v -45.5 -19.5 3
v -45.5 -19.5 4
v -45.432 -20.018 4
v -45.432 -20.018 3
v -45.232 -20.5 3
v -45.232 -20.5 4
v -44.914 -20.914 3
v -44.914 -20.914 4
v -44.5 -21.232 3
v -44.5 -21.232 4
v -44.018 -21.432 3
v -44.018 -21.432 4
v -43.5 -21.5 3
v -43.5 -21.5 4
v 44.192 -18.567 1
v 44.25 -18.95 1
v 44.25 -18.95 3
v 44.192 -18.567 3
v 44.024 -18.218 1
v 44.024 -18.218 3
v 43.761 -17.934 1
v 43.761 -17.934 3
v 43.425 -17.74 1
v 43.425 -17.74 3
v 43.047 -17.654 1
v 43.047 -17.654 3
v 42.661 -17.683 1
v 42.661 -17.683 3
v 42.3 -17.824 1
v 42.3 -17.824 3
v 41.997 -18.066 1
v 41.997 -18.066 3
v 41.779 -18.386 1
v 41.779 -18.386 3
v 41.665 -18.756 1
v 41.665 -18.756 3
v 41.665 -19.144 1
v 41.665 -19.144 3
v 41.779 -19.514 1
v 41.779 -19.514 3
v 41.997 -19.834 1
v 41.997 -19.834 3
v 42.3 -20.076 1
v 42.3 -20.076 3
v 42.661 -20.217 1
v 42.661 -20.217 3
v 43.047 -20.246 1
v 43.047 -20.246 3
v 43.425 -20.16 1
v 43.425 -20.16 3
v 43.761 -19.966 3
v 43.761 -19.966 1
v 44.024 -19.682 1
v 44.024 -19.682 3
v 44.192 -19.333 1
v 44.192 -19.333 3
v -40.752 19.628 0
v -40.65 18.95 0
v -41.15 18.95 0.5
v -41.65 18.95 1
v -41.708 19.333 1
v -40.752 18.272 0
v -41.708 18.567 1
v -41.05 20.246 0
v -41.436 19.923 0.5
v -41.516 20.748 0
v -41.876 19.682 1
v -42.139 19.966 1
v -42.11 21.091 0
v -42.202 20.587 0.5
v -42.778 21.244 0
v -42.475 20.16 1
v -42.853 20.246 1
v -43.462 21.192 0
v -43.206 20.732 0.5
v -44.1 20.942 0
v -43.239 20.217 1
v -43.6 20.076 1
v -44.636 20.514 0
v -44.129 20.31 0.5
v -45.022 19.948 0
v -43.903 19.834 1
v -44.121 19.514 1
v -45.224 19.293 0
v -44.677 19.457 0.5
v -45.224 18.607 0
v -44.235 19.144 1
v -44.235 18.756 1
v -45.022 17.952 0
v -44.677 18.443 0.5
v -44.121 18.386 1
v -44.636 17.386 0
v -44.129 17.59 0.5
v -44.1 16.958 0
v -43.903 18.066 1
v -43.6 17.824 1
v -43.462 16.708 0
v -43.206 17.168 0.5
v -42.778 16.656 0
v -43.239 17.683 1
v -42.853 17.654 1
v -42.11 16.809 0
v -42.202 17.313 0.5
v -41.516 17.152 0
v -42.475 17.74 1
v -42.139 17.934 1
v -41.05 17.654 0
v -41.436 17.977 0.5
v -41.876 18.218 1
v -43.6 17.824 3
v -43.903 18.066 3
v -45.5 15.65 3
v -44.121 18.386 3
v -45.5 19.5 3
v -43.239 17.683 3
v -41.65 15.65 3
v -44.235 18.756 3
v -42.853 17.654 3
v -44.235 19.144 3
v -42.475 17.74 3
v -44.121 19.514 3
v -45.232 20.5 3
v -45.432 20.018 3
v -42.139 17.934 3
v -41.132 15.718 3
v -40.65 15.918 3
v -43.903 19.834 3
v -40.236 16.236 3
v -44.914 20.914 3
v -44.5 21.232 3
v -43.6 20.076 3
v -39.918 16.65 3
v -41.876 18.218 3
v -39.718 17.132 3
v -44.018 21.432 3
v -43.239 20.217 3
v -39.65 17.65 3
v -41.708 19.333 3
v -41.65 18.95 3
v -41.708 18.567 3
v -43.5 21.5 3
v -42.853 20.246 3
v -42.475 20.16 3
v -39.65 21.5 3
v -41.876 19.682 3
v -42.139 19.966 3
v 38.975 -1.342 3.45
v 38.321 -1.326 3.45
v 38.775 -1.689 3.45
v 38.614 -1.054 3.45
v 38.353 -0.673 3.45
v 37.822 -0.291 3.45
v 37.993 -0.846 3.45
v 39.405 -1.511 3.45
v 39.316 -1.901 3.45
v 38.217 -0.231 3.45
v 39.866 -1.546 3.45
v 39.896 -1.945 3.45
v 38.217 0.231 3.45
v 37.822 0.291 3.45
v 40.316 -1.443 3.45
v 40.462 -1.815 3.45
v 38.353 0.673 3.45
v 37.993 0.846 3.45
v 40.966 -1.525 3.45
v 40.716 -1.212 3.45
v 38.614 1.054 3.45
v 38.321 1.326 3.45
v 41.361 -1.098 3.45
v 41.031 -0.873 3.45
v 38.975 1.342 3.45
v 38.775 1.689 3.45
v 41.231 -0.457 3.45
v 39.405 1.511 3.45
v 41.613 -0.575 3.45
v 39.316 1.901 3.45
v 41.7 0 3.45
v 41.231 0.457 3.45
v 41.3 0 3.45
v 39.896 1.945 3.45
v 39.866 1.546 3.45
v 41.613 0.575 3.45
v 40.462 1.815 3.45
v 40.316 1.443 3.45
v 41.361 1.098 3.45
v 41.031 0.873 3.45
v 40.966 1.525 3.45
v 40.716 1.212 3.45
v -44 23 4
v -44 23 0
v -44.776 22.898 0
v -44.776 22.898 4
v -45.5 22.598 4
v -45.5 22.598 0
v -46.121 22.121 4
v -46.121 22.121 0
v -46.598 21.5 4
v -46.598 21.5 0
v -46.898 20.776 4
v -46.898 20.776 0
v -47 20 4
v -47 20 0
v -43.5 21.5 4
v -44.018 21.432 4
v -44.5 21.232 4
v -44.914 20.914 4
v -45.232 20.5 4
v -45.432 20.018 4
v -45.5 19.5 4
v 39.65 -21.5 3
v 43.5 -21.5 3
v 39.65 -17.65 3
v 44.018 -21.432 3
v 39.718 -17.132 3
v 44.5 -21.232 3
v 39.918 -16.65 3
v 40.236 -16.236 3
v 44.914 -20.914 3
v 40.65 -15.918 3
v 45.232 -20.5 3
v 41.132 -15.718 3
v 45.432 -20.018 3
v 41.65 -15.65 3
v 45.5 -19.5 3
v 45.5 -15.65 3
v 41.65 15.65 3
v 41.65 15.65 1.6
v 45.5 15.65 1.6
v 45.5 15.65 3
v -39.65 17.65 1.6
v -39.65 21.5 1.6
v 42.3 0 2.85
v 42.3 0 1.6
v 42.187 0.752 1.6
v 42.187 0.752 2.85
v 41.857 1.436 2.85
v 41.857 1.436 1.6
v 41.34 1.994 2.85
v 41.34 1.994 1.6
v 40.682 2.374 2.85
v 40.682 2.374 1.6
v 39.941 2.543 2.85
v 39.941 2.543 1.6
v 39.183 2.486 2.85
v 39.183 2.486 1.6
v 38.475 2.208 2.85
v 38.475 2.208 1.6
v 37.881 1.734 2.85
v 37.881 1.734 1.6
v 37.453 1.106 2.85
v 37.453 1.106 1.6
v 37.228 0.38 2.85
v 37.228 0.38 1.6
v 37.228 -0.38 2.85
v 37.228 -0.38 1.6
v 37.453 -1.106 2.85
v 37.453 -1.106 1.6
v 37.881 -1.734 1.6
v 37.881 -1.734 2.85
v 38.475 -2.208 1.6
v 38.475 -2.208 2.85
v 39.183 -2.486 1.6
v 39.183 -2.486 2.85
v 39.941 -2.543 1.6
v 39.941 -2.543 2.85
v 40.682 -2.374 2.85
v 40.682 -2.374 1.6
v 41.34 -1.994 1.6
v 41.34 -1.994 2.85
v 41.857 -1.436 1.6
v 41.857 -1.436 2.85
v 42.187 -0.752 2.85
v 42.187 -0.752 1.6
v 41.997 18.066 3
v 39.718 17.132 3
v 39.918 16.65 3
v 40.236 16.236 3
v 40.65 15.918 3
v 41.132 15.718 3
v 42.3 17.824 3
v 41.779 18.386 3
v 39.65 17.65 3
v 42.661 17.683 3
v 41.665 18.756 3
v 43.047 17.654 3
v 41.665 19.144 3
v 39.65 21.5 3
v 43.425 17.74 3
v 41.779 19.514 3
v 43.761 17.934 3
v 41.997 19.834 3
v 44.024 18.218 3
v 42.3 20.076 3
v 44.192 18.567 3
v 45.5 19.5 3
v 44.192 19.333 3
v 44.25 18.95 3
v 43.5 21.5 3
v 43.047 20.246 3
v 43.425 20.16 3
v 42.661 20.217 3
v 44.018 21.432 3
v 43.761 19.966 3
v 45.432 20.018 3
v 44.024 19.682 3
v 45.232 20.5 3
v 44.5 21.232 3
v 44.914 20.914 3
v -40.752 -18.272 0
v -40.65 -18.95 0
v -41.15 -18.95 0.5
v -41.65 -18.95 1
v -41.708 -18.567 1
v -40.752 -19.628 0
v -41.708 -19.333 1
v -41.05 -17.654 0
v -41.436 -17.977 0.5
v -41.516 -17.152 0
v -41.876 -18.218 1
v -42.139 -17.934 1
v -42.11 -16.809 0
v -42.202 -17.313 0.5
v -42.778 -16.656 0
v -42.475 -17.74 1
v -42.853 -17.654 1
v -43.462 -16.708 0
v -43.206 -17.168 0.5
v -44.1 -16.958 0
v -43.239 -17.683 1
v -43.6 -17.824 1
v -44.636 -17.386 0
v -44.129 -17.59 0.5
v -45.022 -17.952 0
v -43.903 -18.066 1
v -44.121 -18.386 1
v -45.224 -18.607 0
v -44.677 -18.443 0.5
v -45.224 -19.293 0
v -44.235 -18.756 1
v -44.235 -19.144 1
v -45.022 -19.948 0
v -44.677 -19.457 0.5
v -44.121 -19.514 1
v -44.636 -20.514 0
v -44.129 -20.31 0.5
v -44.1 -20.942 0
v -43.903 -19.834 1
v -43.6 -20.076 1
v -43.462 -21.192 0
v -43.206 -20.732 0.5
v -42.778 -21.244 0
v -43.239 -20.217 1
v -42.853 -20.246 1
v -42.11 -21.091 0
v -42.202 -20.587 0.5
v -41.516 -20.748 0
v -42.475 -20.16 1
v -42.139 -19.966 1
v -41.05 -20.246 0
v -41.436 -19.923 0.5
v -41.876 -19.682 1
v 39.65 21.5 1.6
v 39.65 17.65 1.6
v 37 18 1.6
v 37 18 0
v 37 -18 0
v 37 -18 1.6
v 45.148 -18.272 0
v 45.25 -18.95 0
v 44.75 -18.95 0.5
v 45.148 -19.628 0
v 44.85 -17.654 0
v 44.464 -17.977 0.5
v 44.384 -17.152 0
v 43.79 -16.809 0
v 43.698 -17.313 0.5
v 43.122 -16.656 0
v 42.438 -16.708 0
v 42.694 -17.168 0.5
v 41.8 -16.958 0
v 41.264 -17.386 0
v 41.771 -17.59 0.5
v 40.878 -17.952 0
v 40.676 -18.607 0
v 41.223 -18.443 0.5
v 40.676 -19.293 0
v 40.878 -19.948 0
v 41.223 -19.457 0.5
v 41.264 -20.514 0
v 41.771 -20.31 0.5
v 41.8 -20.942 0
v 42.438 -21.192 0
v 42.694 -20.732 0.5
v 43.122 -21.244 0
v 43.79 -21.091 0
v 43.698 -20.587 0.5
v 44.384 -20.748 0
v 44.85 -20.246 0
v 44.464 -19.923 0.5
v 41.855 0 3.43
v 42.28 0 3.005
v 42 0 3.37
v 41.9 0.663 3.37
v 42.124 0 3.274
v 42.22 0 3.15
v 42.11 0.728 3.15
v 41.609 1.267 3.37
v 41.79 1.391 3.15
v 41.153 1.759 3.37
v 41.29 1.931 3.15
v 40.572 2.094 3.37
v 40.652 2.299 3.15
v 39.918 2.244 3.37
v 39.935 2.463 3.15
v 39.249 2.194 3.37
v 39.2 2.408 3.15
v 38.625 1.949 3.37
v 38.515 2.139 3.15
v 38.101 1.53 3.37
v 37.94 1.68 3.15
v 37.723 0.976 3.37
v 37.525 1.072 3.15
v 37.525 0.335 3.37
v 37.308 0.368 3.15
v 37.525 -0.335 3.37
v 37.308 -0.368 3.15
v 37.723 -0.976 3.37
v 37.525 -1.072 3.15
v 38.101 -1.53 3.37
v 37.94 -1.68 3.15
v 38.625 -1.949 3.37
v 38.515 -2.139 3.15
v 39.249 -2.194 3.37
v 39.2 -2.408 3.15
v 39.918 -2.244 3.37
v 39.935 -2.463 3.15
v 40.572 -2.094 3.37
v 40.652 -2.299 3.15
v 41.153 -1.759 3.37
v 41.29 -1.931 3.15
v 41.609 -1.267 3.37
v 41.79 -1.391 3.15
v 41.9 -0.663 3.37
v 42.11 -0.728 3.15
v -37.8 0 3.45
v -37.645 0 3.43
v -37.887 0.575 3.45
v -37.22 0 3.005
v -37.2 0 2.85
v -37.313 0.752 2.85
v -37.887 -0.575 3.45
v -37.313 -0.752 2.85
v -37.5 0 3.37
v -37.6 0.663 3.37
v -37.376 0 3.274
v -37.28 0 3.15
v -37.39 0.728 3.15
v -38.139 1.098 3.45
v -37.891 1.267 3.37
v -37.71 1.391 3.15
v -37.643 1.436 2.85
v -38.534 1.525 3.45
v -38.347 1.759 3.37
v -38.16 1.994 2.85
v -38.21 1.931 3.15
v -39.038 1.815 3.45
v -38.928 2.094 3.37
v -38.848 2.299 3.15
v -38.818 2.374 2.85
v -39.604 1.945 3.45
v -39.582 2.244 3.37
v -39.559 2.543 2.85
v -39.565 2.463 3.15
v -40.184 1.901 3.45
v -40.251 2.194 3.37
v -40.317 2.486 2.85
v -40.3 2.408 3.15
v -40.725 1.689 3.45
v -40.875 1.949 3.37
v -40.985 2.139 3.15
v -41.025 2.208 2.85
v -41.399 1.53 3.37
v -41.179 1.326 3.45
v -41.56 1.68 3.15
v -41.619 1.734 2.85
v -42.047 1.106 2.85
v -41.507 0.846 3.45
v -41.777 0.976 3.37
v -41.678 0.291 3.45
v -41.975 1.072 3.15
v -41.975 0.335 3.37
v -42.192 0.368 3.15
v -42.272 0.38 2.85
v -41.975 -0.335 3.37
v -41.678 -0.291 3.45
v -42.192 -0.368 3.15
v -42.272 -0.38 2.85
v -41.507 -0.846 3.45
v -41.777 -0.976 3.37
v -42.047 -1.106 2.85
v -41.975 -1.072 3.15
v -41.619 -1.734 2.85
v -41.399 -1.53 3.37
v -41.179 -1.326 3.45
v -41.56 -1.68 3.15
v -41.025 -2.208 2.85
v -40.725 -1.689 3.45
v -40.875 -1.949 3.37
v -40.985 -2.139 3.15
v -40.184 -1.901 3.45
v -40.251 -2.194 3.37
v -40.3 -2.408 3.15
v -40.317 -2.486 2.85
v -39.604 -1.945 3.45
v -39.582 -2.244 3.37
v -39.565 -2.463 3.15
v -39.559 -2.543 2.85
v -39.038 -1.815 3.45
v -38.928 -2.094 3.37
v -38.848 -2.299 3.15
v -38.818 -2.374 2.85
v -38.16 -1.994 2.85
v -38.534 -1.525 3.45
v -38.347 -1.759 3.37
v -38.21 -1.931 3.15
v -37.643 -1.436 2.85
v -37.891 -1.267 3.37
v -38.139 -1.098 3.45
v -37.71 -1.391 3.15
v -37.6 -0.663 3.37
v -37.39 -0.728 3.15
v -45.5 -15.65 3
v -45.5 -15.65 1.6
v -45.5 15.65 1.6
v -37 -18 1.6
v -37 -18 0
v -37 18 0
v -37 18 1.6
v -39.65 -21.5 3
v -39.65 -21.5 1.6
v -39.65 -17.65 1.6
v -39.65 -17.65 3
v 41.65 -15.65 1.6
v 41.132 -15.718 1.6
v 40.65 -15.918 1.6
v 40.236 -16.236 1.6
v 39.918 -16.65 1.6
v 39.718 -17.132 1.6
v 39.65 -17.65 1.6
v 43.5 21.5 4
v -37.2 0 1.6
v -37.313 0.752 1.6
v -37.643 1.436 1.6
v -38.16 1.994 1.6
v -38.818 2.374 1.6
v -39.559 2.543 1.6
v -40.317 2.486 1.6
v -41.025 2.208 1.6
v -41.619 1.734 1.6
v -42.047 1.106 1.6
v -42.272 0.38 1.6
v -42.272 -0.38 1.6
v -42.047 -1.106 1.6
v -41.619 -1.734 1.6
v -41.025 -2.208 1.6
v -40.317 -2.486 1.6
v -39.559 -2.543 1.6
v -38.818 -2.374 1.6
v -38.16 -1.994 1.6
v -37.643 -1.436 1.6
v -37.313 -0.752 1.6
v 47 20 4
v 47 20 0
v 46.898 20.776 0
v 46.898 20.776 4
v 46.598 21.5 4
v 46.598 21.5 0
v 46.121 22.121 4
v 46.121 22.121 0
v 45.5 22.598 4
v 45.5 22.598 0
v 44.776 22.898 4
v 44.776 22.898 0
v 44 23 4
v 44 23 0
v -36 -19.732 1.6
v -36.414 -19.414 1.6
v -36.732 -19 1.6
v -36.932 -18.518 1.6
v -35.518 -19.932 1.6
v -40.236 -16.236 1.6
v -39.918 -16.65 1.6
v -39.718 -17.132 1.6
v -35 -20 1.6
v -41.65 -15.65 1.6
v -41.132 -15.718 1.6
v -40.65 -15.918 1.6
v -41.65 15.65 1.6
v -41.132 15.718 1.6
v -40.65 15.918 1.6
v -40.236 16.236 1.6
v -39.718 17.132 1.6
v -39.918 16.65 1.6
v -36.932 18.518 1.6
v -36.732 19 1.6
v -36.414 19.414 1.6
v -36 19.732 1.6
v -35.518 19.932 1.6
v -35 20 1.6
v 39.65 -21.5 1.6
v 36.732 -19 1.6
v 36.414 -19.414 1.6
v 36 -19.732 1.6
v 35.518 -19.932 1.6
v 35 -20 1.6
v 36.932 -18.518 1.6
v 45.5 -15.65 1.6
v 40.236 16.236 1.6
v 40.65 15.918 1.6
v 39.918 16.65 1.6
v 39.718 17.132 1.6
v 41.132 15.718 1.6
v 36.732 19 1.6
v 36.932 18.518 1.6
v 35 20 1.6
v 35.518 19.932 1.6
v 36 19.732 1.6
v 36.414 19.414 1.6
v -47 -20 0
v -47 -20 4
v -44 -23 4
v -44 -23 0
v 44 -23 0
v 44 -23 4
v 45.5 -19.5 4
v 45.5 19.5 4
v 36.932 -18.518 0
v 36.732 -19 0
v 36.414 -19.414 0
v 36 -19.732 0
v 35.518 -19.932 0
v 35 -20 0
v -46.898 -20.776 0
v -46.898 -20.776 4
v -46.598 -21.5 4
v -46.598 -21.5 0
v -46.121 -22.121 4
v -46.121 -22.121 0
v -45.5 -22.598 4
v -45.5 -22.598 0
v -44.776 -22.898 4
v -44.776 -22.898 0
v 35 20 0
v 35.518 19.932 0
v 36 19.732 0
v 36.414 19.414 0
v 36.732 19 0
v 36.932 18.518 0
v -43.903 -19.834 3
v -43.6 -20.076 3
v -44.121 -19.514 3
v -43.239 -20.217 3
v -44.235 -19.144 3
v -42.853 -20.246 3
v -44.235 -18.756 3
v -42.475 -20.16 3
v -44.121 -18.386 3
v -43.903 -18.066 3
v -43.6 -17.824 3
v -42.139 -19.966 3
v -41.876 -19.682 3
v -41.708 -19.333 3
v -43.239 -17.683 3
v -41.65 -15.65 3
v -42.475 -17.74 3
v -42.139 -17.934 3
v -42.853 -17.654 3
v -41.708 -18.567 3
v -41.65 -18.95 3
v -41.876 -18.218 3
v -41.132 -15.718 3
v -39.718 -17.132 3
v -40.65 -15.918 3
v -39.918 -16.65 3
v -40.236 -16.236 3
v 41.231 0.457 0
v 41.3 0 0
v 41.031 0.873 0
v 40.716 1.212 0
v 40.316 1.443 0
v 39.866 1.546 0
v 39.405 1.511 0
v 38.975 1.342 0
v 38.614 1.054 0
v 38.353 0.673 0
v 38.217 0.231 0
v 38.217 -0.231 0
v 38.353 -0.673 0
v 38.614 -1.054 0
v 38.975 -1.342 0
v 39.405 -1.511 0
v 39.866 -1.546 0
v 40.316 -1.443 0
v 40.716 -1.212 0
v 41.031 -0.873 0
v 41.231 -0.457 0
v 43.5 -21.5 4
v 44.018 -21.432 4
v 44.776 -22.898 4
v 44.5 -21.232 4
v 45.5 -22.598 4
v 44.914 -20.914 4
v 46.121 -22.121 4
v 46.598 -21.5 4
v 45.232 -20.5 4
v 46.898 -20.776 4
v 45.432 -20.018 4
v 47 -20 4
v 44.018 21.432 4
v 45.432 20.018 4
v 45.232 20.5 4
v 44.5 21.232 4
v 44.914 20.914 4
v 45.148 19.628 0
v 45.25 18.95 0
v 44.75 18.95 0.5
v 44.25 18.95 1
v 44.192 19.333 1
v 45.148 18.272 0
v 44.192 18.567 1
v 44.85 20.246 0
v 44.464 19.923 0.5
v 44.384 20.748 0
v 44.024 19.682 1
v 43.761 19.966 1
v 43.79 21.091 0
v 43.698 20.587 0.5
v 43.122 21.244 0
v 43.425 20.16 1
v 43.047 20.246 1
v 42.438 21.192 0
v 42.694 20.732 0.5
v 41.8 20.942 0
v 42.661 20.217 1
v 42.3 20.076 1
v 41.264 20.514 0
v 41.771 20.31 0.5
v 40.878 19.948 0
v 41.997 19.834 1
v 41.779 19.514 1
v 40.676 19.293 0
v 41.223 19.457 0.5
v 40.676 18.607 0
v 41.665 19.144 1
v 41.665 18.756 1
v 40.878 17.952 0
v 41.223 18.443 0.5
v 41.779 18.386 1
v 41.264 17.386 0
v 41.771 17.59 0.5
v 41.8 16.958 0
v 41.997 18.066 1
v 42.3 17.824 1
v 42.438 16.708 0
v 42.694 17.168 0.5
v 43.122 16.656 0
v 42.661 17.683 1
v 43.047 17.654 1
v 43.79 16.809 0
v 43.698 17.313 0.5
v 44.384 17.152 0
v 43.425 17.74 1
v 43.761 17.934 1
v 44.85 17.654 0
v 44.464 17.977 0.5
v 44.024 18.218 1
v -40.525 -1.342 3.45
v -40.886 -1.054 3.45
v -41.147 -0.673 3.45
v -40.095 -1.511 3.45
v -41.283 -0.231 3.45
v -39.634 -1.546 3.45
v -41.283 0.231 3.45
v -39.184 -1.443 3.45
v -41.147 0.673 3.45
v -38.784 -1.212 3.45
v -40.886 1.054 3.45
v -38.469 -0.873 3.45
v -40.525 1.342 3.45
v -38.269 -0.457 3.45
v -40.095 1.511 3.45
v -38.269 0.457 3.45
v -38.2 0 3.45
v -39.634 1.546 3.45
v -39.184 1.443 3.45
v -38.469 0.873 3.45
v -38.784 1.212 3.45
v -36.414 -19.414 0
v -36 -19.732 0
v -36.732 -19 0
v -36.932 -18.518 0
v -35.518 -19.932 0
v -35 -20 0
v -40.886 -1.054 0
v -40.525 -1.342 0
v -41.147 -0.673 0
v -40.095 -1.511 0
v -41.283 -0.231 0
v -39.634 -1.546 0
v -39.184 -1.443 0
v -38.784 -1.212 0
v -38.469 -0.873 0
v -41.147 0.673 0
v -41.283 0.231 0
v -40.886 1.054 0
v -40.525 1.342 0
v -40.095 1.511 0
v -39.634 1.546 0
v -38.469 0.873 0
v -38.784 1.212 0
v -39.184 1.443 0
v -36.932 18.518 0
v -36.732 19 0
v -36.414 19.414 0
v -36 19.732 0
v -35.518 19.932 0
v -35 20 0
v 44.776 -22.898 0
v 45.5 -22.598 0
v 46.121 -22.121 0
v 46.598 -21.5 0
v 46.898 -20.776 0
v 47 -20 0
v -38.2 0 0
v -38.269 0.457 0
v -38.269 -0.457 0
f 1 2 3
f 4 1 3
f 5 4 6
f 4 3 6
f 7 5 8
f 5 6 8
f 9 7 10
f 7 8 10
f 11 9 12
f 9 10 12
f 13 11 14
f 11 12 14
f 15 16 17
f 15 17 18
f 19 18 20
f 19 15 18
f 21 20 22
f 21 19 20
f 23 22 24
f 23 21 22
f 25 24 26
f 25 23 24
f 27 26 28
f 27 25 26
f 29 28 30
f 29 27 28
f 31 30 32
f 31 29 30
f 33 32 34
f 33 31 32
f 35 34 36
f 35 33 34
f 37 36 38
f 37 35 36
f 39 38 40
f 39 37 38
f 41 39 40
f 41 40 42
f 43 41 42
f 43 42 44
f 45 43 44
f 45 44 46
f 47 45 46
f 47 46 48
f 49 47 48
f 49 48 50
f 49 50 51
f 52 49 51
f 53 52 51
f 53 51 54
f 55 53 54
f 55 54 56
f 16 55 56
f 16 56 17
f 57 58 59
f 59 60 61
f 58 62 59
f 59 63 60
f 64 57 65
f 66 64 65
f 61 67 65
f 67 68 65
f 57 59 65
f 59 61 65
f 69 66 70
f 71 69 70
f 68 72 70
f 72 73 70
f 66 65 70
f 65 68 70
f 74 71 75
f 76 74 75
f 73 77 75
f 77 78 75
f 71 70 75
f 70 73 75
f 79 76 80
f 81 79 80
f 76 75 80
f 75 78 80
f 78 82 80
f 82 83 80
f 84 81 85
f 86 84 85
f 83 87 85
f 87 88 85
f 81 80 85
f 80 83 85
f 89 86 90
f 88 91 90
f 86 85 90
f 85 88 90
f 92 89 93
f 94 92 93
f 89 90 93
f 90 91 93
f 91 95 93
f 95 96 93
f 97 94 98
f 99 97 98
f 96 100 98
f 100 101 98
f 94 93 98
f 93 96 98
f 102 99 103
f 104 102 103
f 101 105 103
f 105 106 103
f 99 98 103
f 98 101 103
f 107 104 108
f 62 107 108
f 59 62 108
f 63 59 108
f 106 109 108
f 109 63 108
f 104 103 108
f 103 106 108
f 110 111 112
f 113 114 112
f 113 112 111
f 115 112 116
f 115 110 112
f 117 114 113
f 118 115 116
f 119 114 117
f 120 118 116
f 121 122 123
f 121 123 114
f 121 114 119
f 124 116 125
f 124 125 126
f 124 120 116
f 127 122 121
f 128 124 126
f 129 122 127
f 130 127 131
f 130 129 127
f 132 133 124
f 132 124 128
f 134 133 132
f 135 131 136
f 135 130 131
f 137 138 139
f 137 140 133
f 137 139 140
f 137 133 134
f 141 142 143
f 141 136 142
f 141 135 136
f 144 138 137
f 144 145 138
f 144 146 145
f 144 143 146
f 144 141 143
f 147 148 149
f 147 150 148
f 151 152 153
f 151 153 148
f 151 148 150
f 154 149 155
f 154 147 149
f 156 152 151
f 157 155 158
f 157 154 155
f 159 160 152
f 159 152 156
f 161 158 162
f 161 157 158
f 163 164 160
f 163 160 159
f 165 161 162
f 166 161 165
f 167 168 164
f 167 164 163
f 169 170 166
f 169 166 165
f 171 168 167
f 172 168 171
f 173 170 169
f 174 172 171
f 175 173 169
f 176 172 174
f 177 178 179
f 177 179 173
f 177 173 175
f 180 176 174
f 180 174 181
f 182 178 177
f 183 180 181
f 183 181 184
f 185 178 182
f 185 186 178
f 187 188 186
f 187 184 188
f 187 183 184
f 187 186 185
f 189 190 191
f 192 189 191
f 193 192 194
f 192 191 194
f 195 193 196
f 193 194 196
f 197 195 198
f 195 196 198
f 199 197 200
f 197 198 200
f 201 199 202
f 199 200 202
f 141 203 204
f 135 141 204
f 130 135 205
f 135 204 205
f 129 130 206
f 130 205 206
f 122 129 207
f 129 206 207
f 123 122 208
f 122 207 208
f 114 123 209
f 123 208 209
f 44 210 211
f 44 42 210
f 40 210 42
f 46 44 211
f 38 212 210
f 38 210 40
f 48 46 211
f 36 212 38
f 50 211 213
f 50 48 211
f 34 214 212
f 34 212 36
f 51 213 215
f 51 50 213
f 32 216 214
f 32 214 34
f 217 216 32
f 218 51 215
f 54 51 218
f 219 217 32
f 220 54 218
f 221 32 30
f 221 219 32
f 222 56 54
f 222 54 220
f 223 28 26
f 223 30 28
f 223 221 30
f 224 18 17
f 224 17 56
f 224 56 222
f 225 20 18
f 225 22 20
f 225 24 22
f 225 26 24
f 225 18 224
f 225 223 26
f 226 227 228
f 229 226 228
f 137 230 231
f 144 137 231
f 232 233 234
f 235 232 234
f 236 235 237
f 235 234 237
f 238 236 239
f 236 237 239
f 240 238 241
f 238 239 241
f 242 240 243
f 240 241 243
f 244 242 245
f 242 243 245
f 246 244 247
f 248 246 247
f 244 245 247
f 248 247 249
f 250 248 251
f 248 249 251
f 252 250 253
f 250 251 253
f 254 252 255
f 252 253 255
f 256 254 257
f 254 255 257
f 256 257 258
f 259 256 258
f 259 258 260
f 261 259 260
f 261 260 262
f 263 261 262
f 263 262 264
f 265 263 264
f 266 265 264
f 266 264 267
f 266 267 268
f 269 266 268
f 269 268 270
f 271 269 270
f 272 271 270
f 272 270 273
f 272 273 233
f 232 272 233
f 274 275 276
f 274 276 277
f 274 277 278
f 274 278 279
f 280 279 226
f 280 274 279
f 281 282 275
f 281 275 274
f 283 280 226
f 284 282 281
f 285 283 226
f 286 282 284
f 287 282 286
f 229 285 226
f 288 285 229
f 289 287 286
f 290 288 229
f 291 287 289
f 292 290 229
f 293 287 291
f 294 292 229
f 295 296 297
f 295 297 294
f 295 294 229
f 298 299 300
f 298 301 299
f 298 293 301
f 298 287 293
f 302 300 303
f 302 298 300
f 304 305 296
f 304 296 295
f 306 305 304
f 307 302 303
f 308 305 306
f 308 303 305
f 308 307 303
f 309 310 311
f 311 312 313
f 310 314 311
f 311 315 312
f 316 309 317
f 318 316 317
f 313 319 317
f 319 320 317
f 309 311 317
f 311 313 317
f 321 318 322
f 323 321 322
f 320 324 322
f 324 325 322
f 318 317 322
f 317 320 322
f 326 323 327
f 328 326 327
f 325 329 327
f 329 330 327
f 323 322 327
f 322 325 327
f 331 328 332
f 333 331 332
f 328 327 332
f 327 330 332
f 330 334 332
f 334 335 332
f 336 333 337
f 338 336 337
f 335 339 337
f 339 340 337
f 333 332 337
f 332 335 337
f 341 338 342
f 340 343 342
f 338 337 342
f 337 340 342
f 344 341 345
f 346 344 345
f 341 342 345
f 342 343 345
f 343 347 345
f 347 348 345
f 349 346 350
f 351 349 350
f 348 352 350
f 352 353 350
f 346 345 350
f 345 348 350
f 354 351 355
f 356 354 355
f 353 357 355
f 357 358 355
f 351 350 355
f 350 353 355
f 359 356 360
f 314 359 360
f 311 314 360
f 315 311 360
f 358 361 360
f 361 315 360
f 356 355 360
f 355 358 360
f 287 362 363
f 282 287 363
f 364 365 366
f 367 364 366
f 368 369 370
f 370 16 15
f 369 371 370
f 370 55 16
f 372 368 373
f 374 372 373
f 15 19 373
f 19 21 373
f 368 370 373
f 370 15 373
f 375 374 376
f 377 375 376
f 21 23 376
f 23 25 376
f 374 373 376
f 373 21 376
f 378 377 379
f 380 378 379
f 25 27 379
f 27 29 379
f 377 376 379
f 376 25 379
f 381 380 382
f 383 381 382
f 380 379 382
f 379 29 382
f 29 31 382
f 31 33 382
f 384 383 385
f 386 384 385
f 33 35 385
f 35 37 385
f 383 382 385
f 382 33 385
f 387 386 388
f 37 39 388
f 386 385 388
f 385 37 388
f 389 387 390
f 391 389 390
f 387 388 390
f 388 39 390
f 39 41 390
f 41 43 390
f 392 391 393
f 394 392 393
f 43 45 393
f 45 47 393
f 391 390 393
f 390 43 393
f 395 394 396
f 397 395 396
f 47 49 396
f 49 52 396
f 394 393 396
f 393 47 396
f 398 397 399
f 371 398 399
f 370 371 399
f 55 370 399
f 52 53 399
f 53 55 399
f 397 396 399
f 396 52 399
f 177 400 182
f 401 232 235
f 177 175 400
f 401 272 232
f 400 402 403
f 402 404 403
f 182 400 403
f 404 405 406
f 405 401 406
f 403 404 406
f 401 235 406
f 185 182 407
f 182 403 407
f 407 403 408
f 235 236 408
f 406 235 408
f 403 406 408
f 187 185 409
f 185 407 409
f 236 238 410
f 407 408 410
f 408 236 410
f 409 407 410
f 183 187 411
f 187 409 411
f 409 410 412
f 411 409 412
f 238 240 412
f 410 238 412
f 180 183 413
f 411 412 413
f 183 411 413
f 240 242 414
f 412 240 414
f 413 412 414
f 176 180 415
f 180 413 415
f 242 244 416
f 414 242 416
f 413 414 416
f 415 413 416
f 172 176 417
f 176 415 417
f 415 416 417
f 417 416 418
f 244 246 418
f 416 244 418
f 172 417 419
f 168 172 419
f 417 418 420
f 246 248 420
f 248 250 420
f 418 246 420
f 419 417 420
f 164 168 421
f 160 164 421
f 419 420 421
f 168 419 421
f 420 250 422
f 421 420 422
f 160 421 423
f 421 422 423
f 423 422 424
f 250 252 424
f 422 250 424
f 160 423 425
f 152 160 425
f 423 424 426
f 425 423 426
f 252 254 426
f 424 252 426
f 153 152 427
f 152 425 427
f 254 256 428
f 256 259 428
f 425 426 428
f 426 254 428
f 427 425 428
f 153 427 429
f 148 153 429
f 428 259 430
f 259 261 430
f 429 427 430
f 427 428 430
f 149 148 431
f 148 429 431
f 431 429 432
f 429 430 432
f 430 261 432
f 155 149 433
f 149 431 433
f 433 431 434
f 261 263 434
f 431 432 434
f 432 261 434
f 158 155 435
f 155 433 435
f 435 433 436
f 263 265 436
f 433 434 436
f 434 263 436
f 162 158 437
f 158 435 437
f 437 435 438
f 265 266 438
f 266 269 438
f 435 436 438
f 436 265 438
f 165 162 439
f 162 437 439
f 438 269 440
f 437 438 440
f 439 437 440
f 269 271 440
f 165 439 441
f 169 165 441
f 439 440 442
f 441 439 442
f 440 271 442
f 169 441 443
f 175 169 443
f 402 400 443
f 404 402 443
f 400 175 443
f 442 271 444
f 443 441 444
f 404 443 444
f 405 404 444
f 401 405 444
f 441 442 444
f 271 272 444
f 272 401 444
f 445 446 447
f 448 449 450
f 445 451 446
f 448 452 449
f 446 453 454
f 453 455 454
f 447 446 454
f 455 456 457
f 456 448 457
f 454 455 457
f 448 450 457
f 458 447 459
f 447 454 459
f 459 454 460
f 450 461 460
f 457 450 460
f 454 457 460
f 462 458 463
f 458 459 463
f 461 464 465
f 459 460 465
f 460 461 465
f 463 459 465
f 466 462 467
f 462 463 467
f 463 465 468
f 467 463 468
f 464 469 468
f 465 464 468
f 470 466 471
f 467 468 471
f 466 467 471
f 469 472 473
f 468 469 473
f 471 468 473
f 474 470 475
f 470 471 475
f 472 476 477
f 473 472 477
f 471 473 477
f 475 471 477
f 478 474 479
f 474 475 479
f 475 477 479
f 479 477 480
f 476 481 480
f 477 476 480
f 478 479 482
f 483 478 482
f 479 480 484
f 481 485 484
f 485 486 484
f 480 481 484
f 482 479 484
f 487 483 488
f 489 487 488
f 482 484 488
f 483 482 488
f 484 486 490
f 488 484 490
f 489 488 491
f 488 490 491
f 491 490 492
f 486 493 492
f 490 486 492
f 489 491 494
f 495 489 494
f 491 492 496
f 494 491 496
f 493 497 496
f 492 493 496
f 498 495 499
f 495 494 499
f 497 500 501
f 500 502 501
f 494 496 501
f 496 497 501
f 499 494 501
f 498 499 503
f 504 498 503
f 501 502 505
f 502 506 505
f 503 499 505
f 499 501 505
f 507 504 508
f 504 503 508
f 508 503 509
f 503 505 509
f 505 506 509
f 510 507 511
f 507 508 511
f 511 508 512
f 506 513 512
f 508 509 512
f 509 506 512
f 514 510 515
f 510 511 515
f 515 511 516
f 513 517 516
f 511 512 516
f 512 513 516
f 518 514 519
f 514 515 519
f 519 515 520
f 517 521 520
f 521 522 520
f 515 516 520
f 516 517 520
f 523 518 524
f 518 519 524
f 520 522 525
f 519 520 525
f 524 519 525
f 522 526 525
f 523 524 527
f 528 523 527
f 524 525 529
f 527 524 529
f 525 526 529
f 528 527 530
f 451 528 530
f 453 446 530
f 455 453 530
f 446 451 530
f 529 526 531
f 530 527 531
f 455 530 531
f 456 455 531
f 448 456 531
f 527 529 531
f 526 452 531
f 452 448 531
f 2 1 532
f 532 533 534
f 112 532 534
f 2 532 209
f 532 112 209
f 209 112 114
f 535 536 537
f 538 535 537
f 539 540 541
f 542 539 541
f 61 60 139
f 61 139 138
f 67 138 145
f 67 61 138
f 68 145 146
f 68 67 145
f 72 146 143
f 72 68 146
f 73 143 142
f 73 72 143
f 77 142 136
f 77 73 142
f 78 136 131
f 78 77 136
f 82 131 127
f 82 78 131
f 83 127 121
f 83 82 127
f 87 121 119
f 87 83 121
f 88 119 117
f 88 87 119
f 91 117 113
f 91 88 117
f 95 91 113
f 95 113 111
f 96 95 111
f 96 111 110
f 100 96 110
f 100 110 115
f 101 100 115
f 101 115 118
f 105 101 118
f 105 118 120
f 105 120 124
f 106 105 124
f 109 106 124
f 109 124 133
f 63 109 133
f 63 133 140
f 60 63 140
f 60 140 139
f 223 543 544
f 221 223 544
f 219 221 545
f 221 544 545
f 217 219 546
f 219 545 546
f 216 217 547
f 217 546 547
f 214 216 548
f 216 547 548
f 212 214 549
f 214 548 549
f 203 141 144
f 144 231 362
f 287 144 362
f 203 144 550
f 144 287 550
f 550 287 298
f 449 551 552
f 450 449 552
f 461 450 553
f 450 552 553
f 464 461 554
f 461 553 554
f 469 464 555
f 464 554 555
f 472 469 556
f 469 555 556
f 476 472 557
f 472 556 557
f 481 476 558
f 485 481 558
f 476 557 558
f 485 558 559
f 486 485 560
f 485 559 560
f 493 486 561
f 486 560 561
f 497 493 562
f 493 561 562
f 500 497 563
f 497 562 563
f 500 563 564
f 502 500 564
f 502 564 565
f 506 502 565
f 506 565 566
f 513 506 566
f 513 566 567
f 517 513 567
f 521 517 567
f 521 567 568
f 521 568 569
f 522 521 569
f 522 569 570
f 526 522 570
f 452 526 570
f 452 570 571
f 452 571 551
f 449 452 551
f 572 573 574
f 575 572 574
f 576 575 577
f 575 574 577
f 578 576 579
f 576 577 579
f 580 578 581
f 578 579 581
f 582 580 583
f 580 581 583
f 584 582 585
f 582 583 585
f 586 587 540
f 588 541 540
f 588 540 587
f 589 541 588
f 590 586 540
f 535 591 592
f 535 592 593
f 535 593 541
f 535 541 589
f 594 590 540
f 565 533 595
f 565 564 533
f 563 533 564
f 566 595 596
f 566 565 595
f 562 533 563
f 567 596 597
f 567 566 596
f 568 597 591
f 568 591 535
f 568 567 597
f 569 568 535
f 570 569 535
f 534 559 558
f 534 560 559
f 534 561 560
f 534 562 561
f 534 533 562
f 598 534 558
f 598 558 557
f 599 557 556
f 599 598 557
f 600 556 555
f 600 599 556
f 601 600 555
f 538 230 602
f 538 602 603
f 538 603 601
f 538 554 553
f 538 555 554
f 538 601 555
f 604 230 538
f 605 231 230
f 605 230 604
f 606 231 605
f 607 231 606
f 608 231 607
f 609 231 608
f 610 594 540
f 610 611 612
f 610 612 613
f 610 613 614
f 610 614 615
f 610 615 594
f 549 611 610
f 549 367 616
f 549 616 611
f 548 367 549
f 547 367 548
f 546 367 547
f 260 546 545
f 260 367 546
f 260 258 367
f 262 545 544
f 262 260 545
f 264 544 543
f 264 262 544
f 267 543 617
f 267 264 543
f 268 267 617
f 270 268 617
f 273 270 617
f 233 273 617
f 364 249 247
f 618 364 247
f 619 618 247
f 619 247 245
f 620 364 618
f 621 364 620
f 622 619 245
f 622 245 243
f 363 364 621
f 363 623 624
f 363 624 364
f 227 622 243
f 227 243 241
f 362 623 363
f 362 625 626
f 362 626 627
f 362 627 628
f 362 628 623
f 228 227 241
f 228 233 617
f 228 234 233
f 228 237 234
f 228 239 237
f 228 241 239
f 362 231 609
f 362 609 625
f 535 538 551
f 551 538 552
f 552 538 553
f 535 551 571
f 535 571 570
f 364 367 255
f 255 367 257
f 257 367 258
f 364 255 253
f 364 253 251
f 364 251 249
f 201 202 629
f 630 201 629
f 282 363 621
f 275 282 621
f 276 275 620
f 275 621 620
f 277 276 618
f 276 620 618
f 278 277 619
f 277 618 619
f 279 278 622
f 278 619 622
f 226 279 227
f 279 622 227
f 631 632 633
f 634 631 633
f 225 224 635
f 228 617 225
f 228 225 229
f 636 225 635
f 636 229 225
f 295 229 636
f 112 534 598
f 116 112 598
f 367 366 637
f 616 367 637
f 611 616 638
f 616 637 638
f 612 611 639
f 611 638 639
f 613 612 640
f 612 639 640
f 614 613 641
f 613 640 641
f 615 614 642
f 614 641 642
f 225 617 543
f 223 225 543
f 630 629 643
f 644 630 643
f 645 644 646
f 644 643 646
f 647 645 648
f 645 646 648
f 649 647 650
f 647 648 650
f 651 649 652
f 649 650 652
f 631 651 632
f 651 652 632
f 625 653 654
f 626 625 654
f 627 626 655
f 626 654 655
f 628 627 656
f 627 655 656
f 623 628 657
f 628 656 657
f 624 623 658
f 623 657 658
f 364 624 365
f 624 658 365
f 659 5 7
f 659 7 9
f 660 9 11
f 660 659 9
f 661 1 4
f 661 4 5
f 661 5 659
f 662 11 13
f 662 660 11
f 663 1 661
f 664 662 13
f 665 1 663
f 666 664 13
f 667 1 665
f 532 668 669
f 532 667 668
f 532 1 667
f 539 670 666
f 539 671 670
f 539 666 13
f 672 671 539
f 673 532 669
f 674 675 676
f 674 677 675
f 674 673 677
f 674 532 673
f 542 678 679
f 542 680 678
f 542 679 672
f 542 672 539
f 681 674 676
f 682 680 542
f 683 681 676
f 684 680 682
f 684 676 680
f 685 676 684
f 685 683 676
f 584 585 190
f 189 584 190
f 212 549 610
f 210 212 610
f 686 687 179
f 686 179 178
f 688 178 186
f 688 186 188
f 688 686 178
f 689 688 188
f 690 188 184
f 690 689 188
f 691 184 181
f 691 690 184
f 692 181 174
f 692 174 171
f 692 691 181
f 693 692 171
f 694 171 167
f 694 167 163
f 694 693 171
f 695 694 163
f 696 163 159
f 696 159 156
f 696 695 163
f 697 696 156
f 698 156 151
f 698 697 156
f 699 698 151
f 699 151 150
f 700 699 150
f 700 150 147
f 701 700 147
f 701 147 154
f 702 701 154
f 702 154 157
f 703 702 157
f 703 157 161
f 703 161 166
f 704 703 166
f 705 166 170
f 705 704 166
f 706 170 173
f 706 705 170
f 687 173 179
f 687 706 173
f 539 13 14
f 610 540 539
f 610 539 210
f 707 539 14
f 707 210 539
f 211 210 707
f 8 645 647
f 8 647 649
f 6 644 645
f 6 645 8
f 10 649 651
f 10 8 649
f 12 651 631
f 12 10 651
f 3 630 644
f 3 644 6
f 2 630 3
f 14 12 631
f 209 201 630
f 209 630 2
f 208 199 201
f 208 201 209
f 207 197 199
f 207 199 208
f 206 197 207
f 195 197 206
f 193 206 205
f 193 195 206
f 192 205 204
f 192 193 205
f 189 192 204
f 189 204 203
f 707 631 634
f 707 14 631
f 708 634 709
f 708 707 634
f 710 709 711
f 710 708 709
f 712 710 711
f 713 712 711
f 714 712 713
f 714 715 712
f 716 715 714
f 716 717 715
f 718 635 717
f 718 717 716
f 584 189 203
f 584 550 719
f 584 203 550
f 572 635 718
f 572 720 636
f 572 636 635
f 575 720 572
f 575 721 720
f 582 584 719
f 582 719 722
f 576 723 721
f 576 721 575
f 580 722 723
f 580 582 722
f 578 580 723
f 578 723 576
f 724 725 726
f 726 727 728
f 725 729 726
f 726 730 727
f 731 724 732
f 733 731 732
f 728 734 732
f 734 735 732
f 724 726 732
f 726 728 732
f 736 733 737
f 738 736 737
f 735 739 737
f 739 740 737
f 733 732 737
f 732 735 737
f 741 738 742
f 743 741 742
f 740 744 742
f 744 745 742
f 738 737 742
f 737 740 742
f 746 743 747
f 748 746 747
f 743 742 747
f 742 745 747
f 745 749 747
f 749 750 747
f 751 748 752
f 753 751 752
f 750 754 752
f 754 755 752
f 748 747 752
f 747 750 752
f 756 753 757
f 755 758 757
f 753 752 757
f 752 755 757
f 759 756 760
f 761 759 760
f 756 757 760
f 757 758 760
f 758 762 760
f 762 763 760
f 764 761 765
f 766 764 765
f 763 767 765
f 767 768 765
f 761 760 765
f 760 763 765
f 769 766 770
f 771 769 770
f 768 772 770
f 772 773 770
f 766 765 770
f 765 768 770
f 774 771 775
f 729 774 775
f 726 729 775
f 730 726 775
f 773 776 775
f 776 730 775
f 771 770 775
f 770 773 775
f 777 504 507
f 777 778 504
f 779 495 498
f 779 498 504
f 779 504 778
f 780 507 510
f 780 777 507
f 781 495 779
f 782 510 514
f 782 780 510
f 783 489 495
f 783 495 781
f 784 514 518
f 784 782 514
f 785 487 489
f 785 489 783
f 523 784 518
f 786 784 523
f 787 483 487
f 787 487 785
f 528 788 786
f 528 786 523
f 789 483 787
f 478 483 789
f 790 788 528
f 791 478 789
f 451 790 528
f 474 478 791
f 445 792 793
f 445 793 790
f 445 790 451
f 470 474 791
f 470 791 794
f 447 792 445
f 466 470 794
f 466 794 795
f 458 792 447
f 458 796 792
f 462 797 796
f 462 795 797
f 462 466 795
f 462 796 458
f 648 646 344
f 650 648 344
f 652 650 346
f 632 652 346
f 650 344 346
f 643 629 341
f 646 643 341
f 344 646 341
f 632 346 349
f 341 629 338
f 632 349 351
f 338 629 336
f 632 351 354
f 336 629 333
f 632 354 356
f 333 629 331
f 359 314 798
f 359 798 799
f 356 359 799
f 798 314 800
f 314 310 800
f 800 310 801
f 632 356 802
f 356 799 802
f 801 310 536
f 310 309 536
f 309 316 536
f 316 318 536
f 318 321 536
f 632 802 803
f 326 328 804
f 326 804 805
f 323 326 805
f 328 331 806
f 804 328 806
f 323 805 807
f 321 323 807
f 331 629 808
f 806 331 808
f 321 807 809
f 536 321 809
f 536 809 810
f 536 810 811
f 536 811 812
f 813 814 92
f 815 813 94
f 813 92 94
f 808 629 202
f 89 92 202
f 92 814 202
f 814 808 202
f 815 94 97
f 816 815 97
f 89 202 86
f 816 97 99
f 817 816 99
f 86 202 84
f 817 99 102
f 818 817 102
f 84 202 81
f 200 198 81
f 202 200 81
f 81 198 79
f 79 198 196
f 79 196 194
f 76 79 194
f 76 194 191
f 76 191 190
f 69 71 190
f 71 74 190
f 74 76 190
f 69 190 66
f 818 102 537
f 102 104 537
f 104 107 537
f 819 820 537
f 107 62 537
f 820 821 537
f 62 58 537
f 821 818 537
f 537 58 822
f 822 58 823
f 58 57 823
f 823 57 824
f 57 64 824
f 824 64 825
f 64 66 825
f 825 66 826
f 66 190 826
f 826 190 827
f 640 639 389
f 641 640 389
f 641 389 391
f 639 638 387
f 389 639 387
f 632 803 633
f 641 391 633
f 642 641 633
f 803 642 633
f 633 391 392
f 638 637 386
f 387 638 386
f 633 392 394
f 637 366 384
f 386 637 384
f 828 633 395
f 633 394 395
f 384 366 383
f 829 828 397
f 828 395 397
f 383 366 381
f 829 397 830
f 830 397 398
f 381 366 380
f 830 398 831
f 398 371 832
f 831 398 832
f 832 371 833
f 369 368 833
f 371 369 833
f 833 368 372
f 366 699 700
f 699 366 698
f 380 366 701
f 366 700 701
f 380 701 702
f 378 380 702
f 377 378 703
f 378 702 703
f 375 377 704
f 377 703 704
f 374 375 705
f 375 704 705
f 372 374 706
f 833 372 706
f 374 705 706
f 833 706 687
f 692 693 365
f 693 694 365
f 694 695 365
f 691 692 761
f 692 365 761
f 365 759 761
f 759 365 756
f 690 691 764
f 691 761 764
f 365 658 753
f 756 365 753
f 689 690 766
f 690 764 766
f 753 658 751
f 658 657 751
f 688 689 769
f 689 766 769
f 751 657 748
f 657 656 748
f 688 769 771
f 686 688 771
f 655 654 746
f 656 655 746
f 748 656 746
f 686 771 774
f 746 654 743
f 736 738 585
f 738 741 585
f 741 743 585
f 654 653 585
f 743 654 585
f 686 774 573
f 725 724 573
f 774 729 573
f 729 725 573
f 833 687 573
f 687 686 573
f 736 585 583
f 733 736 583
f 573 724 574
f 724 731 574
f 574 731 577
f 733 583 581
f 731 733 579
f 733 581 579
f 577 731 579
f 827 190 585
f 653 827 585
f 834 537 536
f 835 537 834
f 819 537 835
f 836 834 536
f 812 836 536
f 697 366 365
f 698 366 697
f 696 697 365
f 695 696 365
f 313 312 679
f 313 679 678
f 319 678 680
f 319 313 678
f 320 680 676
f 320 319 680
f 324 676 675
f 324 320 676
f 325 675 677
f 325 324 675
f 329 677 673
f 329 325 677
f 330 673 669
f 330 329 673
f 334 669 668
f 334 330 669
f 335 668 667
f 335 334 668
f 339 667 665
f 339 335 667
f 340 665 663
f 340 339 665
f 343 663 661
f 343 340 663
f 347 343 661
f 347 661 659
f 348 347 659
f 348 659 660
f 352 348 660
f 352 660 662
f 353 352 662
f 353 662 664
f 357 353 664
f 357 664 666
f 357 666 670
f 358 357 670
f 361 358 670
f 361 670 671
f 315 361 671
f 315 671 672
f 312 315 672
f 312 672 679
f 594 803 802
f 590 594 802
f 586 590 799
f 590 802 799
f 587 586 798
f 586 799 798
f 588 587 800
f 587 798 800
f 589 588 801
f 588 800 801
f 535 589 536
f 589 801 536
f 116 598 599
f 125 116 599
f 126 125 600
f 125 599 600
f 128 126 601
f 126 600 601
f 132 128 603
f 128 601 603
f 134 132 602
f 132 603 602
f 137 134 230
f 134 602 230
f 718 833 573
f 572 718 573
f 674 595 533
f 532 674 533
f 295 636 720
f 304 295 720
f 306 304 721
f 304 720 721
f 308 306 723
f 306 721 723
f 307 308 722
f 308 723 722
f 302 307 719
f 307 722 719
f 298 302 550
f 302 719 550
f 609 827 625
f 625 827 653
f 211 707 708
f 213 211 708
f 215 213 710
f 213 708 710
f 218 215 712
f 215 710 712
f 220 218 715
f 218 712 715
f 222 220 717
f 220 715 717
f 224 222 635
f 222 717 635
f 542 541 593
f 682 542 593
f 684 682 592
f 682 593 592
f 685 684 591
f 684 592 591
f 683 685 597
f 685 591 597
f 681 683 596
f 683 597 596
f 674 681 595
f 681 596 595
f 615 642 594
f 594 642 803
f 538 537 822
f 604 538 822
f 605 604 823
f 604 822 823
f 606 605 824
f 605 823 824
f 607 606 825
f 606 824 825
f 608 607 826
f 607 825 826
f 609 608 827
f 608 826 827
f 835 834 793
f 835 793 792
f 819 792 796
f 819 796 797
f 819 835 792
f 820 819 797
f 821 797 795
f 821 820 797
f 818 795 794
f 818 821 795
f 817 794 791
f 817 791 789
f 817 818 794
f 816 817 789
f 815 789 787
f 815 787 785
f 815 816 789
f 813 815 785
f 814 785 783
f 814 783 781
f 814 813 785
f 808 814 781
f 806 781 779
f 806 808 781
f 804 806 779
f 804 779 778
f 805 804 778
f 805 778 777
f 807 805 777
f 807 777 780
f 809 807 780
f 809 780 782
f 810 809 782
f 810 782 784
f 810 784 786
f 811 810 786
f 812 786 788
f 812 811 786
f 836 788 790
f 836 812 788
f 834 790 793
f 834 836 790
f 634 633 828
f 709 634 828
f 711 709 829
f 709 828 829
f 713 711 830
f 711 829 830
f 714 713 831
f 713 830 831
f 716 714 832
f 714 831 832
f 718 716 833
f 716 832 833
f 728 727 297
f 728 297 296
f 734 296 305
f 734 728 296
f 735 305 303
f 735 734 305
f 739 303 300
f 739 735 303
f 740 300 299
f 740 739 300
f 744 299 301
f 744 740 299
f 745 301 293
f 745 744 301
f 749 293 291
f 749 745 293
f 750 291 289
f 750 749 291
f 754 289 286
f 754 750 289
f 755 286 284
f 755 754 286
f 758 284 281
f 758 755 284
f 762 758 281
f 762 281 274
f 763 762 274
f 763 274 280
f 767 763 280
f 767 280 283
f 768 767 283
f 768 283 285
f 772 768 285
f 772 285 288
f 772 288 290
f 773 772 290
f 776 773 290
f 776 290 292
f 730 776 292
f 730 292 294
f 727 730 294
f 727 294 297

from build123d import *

# Parameters (mm, degrees)
F0_W     = 1.5
F0_H     = 31.3
F0_R     = 1.3
F0_W_2   = 79.3
F0_H_2   = 1.5
F1_DEPTH = 4
F0_R_2   = 2.55
F2_DEPTH = 1.6
F0_R_3   = 1.55
F3_DEPTH = 3.45
F4_R     = 1.3
F5_DEPTH = 1
F6_SIZE  = 1
F7_R     = 0.6


with BuildPart() as f1:
    # F0 (on Top) → F1 (new body)
    with BuildSketch(Plane.XY):
        with Locations((-46.25, 0)):
            Rectangle(F0_W, F0_H)
        with BuildLine():
            Line((-45.5, -15.65), (-47, -15.65))
            Line((-47, -15.65), (-47, -20))
            ThreePointArc((-47, -20), (-46.1213203436, -22.1213203436), (-44, -23))
            Line((-44, -23), (-39.65, -23))
            Line((-39.65, -23), (-39.65, -21.5))
            Line((-39.65, -21.5), (-45.5, -21.5))
            Line((-45.5, -21.5), (-45.5, -15.65))
        make_face()
        with BuildLine():
            Line((-41.65, -15.65), (-45.5, -15.65))
            Line((-45.5, -15.65), (-45.5, -21.5))
            Line((-45.5, -21.5), (-39.65, -21.5))
            Line((-39.65, -21.5), (-39.65, -17.65))
            ThreePointArc((-39.65, -17.65), (-40.2357864376, -16.2357864376), (-41.65, -15.65))
        make_face()
        with Locations((-42.95, -18.95)):
            Circle(F0_R, mode=Mode.SUBTRACT)
        with Locations((0, -22.25)):
            Rectangle(F0_W_2, F0_H_2)
        with BuildLine():
            Line((-39.65, 23), (-44, 23))
            ThreePointArc((-44, 23), (-46.1213203436, 22.1213203436), (-47, 20))
            Line((-47, 20), (-47, 15.65))
            Line((-47, 15.65), (-45.5, 15.65))
            Line((-45.5, 15.65), (-45.5, 21.5))
            Line((-45.5, 21.5), (-39.65, 21.5))
            Line((-39.65, 21.5), (-39.65, 23))
        make_face()
        with BuildLine():
            Line((-39.65, 17.65), (-39.65, 21.5))
            Line((-39.65, 21.5), (-45.5, 21.5))
            Line((-45.5, 21.5), (-45.5, 15.65))
            Line((-45.5, 15.65), (-41.65, 15.65))
            ThreePointArc((-41.65, 15.65), (-40.2357864376, 16.2357864376), (-39.65, 17.65))
        make_face()
        with Locations((-42.95, 18.95)):
            Circle(F0_R, mode=Mode.SUBTRACT)
        with Locations((0, 22.25)):
            Rectangle(F0_W_2, F0_H_2)
        with BuildLine():
            Line((44, 23), (39.65, 23))
            Line((39.65, 23), (39.65, 21.5))
            Line((39.65, 21.5), (45.5, 21.5))
            Line((45.5, 21.5), (45.5, 15.65))
            Line((45.5, 15.65), (47, 15.65))
            Line((47, 15.65), (47, 20))
            ThreePointArc((47, 20), (46.1213203436, 22.1213203436), (44, 23))
        make_face()
        with BuildLine():
            Line((45.5, 21.5), (39.65, 21.5))
            Line((39.65, 21.5), (39.65, 17.65))
            ThreePointArc((39.65, 17.65), (40.2357864376, 16.2357864376), (41.65, 15.65))
            Line((41.65, 15.65), (45.5, 15.65))
            Line((45.5, 15.65), (45.5, 21.5))
        make_face()
        with Locations((42.95, 18.95)):
            Circle(F0_R, mode=Mode.SUBTRACT)
        with BuildLine():
            Line((45.5, -21.5), (45.5, -15.65))
            Line((45.5, -15.65), (41.65, -15.65))
            ThreePointArc((41.65, -15.65), (40.2357864376, -16.2357864376), (39.65, -17.65))
            Line((39.65, -17.65), (39.65, -21.5))
            Line((39.65, -21.5), (45.5, -21.5))
        make_face()
        with Locations((42.95, -18.95)):
            Circle(F0_R, mode=Mode.SUBTRACT)
        with BuildLine():
            Line((47, -20), (47, -15.65))
            Line((47, -15.65), (45.5, -15.65))
            Line((45.5, -15.65), (45.5, -21.5))
            Line((45.5, -21.5), (39.65, -21.5))
            Line((39.65, -21.5), (39.65, -23))
            Line((39.65, -23), (44, -23))
            ThreePointArc((44, -23), (46.1213203436, -22.1213203436), (47, -20))
        make_face()
        with Locations((46.25, 0)):
            Rectangle(F0_W, F0_H)
    extrude(amount=F1_DEPTH)

    # F0 (on Top) → F2 (join)
    with BuildSketch(Plane.XY):
        with BuildLine():
            Line((39.65, 21.5), (-39.65, 21.5))
            Line((-39.65, 21.5), (-39.65, 17.65))
            ThreePointArc((-39.65, 17.65), (-40.2357864376, 16.2357864376), (-41.65, 15.65))
            Line((-41.65, 15.65), (-45.5, 15.65))
            Line((-45.5, 15.65), (-45.5, -15.65))
            Line((-45.5, -15.65), (-41.65, -15.65))
            ThreePointArc((-41.65, -15.65), (-40.2357864376, -16.2357864376), (-39.65, -17.65))
            Line((-39.65, -17.65), (-39.65, -21.5))
            Line((-39.65, -21.5), (39.65, -21.5))
            Line((39.65, -21.5), (39.65, -17.65))
            ThreePointArc((39.65, -17.65), (40.2357864376, -16.2357864376), (41.65, -15.65))
            Line((41.65, -15.65), (45.5, -15.65))
            Line((45.5, -15.65), (45.5, 15.65))
            Line((45.5, 15.65), (41.65, 15.65))
            ThreePointArc((41.65, 15.65), (40.2357864376, 16.2357864376), (39.65, 17.65))
            Line((39.65, 17.65), (39.65, 21.5))
        make_face()
        with Locations((-39.75, 0)):
            Circle(F0_R_2, mode=Mode.SUBTRACT)
        with BuildLine():
            ThreePointArc((-37, 18), (-36.4142135624, 19.4142135624), (-35, 20))
            Line((-35, 20), (35, 20))
            ThreePointArc((35, 20), (36.4142135624, 19.4142135624), (37, 18))
            Line((37, 18), (37, -18))
            ThreePointArc((37, -18), (36.4142135624, -19.4142135624), (35, -20))
            Line((35, -20), (-35, -20))
            ThreePointArc((-35, -20), (-36.4142135624, -19.4142135624), (-37, -18))
            Line((-37, -18), (-37, 18))
        make_face(mode=Mode.SUBTRACT)
        with Locations((39.75, 0)):
            Circle(F0_R_2, mode=Mode.SUBTRACT)
    extrude(amount=F2_DEPTH)

    # F0 (on Top) → F3 (join)
    with BuildSketch(Plane.XY):
        with Locations((-39.75, 0)):
            Circle(F0_R_2)
        with Locations((-39.75, 0)):
            Circle(F0_R_3, mode=Mode.SUBTRACT)
        with Locations((39.75, 0)):
            Circle(F0_R_2)
        with Locations((39.75, 0)):
            Circle(F0_R_3, mode=Mode.SUBTRACT)
    extrude(amount=F3_DEPTH)

    # F4 (on face) → F5 (cut)
    with BuildSketch(Plane.XY.offset(4)):
        with BuildLine():
            Line((-45.5, 19.5), (-45.5, 15.65))
            Line((-45.5, 15.65), (-41.65, 15.65))
            ThreePointArc((-41.65, 15.65), (-40.2357864376, 16.2357864376), (-39.65, 17.65))
            Line((-39.65, 17.65), (-39.65, 21.5))
            Line((-39.65, 21.5), (-43.5, 21.5))
            ThreePointArc((-43.5, 21.5), (-44.9142135624, 20.9142135624), (-45.5, 19.5))
        make_face()
        with Locations((-42.95, 18.95)):
            Circle(F4_R, mode=Mode.SUBTRACT)
        with BuildLine():
            Line((-41.65, -15.65), (-45.5, -15.65))
            Line((-45.5, -15.65), (-45.5, -19.5))
            ThreePointArc((-45.5, -19.5), (-44.9142135624, -20.9142135624), (-43.5, -21.5))
            Line((-43.5, -21.5), (-39.65, -21.5))
            Line((-39.65, -21.5), (-39.65, -17.65))
            ThreePointArc((-39.65, -17.65), (-40.2357864376, -16.2357864376), (-41.65, -15.65))
        make_face()
        with Locations((-42.95, -18.95)):
            Circle(F4_R, mode=Mode.SUBTRACT)
        with BuildLine():
            Line((39.65, -17.65), (39.65, -21.5))
            Line((39.65, -21.5), (43.5, -21.5))
            ThreePointArc((43.5, -21.5), (44.9142135624, -20.9142135624), (45.5, -19.5))
            Line((45.5, -19.5), (45.5, -15.65))
            Line((45.5, -15.65), (41.65, -15.65))
            ThreePointArc((41.65, -15.65), (40.2357864376, -16.2357864376), (39.65, -17.65))
        make_face()
        with Locations((42.95, -18.95)):
            Circle(F4_R, mode=Mode.SUBTRACT)
        with BuildLine():
            Line((43.5, 21.5), (39.65, 21.5))
            Line((39.65, 21.5), (39.65, 17.65))
            ThreePointArc((39.65, 17.65), (40.2357864376, 16.2357864376), (41.65, 15.65))
            Line((41.65, 15.65), (45.5, 15.65))
            Line((45.5, 15.65), (45.5, 19.5))
            ThreePointArc((45.5, 19.5), (44.9142135624, 20.9142135624), (43.5, 21.5))
        make_face()
        with Locations((42.95, 18.95)):
            Circle(F4_R, mode=Mode.SUBTRACT)
    extrude(amount=-F5_DEPTH, mode=Mode.SUBTRACT)

    # F6
    f6_edges = [f1.edges().sort_by_distance(p)[0] for p in [
        (41.65, 18.95, 0),
        (41.65, -18.95, 0),
        (-44.25, -18.95, 0),
        (-44.25, 18.95, 0),
    ]]
    chamfer(f6_edges, length=F6_SIZE)

    # F7
    f7_edges = [f1.edges().sort_by_distance(p)[0] for p in [
        (37.2, 0, 3.45),
        (-42.3, 0, 3.45),
    ]]
    fillet(f7_edges, radius=F7_R)


solid = f1.part
